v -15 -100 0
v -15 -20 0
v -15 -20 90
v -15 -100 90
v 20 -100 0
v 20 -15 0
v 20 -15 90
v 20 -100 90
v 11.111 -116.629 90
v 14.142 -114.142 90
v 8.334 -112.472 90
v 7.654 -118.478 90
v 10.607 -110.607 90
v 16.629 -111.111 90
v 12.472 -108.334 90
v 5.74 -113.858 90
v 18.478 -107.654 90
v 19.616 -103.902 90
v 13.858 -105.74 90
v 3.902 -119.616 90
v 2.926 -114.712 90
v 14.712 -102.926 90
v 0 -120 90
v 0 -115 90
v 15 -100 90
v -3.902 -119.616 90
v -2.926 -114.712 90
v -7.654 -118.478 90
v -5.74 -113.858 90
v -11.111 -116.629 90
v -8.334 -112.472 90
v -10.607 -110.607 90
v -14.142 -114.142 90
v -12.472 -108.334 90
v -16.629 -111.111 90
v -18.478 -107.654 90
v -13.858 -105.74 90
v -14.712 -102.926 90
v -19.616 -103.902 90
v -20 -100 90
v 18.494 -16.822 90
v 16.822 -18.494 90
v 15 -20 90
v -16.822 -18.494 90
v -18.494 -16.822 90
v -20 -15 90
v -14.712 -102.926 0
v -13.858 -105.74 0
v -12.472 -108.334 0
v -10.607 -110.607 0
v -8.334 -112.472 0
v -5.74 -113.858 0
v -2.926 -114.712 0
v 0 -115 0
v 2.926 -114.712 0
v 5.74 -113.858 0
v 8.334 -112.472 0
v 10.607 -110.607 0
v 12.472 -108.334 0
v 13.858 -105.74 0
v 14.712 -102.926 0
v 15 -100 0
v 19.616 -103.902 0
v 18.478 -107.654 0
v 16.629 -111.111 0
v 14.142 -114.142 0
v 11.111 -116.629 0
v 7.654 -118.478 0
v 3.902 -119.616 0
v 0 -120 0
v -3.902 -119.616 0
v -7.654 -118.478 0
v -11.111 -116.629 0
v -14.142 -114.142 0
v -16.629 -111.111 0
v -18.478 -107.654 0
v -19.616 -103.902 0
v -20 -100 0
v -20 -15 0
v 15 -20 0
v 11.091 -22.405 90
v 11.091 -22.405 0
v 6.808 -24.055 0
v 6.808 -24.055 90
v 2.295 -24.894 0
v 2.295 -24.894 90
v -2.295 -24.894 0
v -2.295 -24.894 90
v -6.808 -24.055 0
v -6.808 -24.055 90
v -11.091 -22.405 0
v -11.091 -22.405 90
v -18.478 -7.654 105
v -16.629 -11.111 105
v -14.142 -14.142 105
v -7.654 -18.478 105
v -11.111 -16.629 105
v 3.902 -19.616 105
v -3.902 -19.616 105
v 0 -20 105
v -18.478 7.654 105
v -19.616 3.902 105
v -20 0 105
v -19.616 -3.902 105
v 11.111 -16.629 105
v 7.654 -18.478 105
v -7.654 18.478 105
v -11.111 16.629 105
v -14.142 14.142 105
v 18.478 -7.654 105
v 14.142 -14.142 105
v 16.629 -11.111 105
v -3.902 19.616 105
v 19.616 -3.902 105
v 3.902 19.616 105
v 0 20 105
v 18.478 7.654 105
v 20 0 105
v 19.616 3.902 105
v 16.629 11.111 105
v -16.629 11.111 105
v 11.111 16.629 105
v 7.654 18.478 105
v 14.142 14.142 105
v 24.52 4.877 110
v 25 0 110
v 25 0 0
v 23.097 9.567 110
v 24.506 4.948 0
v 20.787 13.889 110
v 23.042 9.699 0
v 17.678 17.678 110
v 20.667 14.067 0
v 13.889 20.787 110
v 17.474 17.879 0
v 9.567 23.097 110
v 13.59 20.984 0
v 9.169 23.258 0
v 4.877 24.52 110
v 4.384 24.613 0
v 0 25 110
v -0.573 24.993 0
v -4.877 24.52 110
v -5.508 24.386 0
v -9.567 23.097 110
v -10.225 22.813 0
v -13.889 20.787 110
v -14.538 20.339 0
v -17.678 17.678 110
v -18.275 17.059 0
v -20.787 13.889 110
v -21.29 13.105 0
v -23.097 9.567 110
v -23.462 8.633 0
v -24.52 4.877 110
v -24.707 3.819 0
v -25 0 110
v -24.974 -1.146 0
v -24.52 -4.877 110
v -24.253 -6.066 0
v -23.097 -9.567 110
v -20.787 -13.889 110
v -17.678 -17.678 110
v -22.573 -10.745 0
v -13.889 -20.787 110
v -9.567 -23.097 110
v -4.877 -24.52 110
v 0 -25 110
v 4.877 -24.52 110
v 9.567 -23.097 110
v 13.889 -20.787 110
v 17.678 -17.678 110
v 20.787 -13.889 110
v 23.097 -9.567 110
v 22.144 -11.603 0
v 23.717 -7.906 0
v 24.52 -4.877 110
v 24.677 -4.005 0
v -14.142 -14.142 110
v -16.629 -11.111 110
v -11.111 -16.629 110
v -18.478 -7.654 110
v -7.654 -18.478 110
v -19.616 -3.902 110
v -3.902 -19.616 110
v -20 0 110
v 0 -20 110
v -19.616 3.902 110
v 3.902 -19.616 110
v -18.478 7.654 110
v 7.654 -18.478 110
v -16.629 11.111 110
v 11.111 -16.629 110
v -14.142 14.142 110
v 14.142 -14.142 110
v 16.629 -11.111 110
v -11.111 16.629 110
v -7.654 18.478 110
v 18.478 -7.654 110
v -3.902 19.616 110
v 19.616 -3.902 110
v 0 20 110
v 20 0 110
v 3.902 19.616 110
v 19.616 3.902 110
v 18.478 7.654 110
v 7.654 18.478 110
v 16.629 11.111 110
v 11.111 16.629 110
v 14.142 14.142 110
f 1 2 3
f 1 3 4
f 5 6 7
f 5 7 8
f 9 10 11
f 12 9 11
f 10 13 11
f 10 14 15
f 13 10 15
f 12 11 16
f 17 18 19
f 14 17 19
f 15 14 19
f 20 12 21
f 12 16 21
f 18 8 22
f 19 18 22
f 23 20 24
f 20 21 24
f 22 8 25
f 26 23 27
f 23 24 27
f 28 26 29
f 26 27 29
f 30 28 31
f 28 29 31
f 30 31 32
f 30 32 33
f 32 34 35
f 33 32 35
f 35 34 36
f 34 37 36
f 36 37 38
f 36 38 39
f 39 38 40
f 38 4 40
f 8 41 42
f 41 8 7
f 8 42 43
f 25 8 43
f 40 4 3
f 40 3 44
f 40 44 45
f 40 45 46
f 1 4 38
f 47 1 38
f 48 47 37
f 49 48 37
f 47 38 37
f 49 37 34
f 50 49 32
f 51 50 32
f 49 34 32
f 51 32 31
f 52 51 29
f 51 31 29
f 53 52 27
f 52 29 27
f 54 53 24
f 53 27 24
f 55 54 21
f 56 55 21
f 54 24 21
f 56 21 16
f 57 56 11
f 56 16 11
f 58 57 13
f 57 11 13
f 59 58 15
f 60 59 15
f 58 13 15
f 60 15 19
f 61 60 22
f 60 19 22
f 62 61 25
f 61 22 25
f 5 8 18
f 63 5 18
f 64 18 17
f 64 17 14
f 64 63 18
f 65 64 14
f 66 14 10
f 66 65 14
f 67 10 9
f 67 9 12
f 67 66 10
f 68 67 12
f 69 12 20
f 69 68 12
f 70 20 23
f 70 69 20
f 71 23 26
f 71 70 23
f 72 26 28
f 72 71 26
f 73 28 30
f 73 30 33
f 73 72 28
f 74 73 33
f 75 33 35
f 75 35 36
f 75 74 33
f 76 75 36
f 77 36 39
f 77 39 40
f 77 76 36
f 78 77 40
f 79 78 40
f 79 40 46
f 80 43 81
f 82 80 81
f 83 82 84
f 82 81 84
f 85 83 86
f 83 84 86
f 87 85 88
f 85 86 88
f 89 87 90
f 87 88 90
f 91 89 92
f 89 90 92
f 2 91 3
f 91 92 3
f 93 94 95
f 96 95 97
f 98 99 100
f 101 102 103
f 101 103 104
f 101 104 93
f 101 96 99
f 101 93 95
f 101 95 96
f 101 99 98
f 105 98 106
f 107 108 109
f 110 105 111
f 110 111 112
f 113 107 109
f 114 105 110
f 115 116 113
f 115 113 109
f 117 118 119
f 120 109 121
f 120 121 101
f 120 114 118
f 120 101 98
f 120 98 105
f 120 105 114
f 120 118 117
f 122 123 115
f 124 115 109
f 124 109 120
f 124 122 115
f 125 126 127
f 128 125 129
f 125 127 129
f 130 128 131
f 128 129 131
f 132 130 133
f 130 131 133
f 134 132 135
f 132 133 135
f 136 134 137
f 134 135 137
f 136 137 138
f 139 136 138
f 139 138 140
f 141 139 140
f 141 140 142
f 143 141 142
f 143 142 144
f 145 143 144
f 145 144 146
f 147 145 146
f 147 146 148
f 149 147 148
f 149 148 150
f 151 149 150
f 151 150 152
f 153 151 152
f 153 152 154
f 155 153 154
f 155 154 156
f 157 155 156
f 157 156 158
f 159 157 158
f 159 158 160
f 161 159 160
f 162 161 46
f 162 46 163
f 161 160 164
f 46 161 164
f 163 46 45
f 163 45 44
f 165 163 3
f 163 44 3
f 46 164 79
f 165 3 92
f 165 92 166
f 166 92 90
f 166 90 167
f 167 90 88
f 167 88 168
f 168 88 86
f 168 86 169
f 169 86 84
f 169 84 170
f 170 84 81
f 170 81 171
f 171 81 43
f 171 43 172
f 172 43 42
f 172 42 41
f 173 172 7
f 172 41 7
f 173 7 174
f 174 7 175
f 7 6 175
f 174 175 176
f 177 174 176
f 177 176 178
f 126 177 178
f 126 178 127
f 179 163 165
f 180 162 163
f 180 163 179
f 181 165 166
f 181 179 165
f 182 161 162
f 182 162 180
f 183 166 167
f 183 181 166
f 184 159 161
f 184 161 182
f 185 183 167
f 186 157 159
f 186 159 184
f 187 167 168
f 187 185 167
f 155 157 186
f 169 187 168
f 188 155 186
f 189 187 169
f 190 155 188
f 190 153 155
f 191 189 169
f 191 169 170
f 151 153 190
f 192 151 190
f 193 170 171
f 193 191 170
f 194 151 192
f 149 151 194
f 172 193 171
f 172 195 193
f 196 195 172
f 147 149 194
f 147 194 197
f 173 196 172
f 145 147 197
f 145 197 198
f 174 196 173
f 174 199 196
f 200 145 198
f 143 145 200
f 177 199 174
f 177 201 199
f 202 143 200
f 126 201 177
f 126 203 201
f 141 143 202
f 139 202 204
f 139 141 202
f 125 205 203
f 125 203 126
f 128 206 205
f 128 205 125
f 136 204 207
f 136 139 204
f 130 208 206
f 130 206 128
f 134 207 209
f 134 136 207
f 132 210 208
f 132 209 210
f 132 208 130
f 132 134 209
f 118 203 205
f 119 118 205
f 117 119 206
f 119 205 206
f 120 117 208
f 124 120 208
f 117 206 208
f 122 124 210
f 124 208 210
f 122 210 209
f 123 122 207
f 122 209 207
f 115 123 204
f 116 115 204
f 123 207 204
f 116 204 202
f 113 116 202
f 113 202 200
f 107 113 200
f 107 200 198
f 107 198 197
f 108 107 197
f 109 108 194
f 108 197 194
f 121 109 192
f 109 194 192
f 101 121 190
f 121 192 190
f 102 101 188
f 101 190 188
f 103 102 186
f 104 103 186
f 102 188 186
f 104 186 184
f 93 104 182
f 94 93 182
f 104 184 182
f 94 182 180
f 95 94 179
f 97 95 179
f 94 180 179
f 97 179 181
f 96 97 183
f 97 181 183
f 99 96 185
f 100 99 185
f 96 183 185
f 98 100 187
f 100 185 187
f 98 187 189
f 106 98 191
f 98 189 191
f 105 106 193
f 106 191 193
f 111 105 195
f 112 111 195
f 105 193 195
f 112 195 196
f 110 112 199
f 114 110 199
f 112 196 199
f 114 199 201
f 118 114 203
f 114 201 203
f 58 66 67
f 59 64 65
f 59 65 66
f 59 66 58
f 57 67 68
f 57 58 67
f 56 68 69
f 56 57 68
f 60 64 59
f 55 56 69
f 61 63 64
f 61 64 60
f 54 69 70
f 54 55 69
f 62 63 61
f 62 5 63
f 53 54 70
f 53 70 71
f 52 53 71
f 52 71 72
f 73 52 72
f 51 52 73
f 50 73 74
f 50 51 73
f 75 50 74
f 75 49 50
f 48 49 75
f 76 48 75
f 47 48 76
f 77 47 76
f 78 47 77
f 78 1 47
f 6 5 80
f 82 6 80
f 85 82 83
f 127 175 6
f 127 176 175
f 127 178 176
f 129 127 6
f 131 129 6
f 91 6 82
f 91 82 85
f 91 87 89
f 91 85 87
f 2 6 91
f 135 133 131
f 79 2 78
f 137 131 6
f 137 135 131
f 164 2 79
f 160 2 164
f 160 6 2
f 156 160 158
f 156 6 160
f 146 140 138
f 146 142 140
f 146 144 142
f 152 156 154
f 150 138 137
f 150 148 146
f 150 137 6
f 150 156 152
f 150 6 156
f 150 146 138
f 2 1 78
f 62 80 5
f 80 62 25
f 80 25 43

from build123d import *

# Parameters (mm, degrees)
SKETCH1_R      = 25
EXTRUDE1_DEPTH = 110
SKETCH2_R      = 20
EXTRUDE2_DEPTH = 5
EXTRUDE3_DEPTH = 90
EXTRUDE4_DEPTH = 91


with BuildPart() as part:
    # Sketch1 → Extrude1 (new body)
    with BuildSketch(Plane.XY):
        Circle(SKETCH1_R)
    extrude(amount=EXTRUDE1_DEPTH)

    # Sketch2 → Extrude2 (cut)
    with BuildSketch(Plane.XY.offset(110)):
        Circle(SKETCH2_R)
    extrude(amount=-EXTRUDE2_DEPTH, mode=Mode.SUBTRACT)

    # Sketch3 → Extrude3 (add)
    with BuildSketch(Plane.XY):
        with BuildLine():
            Line((-20, -100), (-20, 0))
            Line((-20, 0), (20, 0))
            Line((20, 0), (20, -100))
            ThreePointArc((20, -100), (0, -120), (-20, -100))
        make_face()
    extrude(amount=EXTRUDE3_DEPTH)

    # Sketch4 → Extrude4 (cut, through all)
    with BuildSketch(Plane.XY.offset(90)):
        with BuildLine():
            Line((-15, -20), (-15, -100))
            ThreePointArc((-15, -100), (0, -115), (15, -100))
            Line((15, -100), (15, -20))
            ThreePointArc((15, -20), (0, -25), (-15, -20))
        make_face()
    extrude(amount=-EXTRUDE4_DEPTH, mode=Mode.SUBTRACT)


solid = part.part
